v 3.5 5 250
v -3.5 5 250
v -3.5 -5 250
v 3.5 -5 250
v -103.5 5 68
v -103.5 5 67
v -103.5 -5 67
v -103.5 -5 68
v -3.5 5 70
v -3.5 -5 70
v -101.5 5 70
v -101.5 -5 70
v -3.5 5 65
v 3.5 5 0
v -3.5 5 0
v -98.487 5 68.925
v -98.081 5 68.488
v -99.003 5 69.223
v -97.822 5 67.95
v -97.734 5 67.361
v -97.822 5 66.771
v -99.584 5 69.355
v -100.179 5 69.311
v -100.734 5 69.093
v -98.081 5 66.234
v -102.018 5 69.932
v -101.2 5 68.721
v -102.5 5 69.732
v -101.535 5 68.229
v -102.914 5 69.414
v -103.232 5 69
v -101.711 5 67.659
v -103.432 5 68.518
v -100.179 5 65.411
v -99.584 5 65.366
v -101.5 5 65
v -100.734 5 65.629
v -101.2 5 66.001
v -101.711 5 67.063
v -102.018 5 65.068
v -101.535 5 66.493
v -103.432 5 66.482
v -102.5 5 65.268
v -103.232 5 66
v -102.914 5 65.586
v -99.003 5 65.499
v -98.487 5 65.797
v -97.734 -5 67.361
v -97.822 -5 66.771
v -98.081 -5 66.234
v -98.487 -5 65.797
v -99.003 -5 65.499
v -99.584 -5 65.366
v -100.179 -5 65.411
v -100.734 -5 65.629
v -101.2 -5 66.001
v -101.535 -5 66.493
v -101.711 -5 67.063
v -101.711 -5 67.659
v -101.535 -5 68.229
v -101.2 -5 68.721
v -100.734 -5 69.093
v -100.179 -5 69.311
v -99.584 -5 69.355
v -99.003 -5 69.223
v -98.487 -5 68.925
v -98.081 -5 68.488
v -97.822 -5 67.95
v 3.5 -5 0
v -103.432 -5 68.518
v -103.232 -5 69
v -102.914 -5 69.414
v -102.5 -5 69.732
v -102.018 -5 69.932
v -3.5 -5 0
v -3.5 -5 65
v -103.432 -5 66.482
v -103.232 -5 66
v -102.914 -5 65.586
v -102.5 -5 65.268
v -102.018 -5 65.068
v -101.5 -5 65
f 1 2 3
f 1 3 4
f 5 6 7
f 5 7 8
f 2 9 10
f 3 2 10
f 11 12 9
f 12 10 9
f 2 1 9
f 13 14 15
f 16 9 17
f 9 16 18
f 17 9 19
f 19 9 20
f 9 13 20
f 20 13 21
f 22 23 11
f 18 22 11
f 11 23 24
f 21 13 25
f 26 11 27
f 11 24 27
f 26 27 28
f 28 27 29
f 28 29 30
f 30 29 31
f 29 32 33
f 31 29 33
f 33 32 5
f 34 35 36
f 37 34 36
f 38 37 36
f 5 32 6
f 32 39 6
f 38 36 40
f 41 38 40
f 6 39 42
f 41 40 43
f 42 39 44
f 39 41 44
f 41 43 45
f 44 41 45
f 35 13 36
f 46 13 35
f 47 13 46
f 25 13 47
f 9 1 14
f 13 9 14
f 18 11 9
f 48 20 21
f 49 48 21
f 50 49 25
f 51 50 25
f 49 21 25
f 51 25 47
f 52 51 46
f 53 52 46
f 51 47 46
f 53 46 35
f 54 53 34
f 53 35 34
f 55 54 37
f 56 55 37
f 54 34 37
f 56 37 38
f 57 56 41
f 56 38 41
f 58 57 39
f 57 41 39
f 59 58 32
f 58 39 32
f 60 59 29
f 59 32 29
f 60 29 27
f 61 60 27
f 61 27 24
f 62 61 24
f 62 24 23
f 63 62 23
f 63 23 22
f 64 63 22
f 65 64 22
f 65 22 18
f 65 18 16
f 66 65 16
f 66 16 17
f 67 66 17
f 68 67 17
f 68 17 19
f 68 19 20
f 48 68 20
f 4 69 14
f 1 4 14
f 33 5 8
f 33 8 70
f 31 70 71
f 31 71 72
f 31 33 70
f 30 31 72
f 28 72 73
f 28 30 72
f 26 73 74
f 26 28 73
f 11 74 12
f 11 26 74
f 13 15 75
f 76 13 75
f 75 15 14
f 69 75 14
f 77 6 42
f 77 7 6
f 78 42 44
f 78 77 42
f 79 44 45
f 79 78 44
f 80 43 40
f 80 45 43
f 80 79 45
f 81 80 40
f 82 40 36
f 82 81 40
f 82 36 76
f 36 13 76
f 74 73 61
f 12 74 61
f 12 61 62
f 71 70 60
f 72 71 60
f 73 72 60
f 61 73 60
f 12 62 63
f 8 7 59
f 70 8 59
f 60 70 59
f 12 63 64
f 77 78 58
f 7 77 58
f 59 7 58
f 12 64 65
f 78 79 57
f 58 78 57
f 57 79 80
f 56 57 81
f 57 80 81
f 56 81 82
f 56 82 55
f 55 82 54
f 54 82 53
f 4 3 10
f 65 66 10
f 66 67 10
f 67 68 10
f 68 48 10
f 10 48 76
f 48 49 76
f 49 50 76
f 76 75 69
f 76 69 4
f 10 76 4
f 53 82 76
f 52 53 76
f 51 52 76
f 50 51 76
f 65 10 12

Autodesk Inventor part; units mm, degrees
ref_plane "YZ Plane" through (0, 0, 0) normal (1, 0, 0) x (0, 1, 0)
ref_plane "XZ Plane" through (0, 0, 0) normal (0, 1, 0) x (-1, 0, 0)
ref_plane "XY Plane" through (0, 0, 0) normal (0, 0, 1) x (1, 0, 0)
sketch "Sketch1" plane through (0, 0, 0) normal (0, 0, 1) x (1, 0, 0)
  line L0 (-3.5, -5) -> (3.5, -5)
  line L1 (3.5, -5) -> (3.5, 5)
  line L2 (3.5, 5) -> (-3.5, 5)
  line L3 (-3.5, 5) -> (-3.5, -5)
  line L4 (-3.5, -5) -> (3.5, 5) construction
  line L5 (3.5, -5) -> (-3.5, 5) construction
  point P0 (0, 0)
  dimension "d0" = 7
  dimension "d1" = 10
extrude "Extrusion1" add sketch "Sketch1" along normal blind 250
sketch "Sketch2" plane through (-3.5, -5, 0) normal (-1, 0, 0) x (0, 0, 1)
  line L0 (0, 0) -> (250, 0) projected
  line L1 (0, 10) -> (250, 10) projected
  line L2 (65, 0) -> (70, 0)
  line L3 (70, 0) -> (70, 10)
  line L4 (70, 10) -> (65, 10)
  line L5 (65, 10) -> (65, 0)
  point P0 (0, 5)
  dimension "d4" = 5
  dimension "d5" = 65
extrude "Extrusion2" add sketch "Sketch2" along normal blind 100
fillet "Fillet1" radius 2 2 edges at (-103.5, 0, 65) (-103.5, 0, 70)
sketch "Sketch3" plane through (3.5, 5, 250) normal (0, 1, 0) x (1, 0, 0)
  circle A0 centre (-103.2335, 182.6391) radius 2
  point P0 (-3.5, 250)
  dimension "d9" = 4
extrude "Extrusion3" cut sketch "Sketch3" against normal through all
properties part number "support_rod_right"
